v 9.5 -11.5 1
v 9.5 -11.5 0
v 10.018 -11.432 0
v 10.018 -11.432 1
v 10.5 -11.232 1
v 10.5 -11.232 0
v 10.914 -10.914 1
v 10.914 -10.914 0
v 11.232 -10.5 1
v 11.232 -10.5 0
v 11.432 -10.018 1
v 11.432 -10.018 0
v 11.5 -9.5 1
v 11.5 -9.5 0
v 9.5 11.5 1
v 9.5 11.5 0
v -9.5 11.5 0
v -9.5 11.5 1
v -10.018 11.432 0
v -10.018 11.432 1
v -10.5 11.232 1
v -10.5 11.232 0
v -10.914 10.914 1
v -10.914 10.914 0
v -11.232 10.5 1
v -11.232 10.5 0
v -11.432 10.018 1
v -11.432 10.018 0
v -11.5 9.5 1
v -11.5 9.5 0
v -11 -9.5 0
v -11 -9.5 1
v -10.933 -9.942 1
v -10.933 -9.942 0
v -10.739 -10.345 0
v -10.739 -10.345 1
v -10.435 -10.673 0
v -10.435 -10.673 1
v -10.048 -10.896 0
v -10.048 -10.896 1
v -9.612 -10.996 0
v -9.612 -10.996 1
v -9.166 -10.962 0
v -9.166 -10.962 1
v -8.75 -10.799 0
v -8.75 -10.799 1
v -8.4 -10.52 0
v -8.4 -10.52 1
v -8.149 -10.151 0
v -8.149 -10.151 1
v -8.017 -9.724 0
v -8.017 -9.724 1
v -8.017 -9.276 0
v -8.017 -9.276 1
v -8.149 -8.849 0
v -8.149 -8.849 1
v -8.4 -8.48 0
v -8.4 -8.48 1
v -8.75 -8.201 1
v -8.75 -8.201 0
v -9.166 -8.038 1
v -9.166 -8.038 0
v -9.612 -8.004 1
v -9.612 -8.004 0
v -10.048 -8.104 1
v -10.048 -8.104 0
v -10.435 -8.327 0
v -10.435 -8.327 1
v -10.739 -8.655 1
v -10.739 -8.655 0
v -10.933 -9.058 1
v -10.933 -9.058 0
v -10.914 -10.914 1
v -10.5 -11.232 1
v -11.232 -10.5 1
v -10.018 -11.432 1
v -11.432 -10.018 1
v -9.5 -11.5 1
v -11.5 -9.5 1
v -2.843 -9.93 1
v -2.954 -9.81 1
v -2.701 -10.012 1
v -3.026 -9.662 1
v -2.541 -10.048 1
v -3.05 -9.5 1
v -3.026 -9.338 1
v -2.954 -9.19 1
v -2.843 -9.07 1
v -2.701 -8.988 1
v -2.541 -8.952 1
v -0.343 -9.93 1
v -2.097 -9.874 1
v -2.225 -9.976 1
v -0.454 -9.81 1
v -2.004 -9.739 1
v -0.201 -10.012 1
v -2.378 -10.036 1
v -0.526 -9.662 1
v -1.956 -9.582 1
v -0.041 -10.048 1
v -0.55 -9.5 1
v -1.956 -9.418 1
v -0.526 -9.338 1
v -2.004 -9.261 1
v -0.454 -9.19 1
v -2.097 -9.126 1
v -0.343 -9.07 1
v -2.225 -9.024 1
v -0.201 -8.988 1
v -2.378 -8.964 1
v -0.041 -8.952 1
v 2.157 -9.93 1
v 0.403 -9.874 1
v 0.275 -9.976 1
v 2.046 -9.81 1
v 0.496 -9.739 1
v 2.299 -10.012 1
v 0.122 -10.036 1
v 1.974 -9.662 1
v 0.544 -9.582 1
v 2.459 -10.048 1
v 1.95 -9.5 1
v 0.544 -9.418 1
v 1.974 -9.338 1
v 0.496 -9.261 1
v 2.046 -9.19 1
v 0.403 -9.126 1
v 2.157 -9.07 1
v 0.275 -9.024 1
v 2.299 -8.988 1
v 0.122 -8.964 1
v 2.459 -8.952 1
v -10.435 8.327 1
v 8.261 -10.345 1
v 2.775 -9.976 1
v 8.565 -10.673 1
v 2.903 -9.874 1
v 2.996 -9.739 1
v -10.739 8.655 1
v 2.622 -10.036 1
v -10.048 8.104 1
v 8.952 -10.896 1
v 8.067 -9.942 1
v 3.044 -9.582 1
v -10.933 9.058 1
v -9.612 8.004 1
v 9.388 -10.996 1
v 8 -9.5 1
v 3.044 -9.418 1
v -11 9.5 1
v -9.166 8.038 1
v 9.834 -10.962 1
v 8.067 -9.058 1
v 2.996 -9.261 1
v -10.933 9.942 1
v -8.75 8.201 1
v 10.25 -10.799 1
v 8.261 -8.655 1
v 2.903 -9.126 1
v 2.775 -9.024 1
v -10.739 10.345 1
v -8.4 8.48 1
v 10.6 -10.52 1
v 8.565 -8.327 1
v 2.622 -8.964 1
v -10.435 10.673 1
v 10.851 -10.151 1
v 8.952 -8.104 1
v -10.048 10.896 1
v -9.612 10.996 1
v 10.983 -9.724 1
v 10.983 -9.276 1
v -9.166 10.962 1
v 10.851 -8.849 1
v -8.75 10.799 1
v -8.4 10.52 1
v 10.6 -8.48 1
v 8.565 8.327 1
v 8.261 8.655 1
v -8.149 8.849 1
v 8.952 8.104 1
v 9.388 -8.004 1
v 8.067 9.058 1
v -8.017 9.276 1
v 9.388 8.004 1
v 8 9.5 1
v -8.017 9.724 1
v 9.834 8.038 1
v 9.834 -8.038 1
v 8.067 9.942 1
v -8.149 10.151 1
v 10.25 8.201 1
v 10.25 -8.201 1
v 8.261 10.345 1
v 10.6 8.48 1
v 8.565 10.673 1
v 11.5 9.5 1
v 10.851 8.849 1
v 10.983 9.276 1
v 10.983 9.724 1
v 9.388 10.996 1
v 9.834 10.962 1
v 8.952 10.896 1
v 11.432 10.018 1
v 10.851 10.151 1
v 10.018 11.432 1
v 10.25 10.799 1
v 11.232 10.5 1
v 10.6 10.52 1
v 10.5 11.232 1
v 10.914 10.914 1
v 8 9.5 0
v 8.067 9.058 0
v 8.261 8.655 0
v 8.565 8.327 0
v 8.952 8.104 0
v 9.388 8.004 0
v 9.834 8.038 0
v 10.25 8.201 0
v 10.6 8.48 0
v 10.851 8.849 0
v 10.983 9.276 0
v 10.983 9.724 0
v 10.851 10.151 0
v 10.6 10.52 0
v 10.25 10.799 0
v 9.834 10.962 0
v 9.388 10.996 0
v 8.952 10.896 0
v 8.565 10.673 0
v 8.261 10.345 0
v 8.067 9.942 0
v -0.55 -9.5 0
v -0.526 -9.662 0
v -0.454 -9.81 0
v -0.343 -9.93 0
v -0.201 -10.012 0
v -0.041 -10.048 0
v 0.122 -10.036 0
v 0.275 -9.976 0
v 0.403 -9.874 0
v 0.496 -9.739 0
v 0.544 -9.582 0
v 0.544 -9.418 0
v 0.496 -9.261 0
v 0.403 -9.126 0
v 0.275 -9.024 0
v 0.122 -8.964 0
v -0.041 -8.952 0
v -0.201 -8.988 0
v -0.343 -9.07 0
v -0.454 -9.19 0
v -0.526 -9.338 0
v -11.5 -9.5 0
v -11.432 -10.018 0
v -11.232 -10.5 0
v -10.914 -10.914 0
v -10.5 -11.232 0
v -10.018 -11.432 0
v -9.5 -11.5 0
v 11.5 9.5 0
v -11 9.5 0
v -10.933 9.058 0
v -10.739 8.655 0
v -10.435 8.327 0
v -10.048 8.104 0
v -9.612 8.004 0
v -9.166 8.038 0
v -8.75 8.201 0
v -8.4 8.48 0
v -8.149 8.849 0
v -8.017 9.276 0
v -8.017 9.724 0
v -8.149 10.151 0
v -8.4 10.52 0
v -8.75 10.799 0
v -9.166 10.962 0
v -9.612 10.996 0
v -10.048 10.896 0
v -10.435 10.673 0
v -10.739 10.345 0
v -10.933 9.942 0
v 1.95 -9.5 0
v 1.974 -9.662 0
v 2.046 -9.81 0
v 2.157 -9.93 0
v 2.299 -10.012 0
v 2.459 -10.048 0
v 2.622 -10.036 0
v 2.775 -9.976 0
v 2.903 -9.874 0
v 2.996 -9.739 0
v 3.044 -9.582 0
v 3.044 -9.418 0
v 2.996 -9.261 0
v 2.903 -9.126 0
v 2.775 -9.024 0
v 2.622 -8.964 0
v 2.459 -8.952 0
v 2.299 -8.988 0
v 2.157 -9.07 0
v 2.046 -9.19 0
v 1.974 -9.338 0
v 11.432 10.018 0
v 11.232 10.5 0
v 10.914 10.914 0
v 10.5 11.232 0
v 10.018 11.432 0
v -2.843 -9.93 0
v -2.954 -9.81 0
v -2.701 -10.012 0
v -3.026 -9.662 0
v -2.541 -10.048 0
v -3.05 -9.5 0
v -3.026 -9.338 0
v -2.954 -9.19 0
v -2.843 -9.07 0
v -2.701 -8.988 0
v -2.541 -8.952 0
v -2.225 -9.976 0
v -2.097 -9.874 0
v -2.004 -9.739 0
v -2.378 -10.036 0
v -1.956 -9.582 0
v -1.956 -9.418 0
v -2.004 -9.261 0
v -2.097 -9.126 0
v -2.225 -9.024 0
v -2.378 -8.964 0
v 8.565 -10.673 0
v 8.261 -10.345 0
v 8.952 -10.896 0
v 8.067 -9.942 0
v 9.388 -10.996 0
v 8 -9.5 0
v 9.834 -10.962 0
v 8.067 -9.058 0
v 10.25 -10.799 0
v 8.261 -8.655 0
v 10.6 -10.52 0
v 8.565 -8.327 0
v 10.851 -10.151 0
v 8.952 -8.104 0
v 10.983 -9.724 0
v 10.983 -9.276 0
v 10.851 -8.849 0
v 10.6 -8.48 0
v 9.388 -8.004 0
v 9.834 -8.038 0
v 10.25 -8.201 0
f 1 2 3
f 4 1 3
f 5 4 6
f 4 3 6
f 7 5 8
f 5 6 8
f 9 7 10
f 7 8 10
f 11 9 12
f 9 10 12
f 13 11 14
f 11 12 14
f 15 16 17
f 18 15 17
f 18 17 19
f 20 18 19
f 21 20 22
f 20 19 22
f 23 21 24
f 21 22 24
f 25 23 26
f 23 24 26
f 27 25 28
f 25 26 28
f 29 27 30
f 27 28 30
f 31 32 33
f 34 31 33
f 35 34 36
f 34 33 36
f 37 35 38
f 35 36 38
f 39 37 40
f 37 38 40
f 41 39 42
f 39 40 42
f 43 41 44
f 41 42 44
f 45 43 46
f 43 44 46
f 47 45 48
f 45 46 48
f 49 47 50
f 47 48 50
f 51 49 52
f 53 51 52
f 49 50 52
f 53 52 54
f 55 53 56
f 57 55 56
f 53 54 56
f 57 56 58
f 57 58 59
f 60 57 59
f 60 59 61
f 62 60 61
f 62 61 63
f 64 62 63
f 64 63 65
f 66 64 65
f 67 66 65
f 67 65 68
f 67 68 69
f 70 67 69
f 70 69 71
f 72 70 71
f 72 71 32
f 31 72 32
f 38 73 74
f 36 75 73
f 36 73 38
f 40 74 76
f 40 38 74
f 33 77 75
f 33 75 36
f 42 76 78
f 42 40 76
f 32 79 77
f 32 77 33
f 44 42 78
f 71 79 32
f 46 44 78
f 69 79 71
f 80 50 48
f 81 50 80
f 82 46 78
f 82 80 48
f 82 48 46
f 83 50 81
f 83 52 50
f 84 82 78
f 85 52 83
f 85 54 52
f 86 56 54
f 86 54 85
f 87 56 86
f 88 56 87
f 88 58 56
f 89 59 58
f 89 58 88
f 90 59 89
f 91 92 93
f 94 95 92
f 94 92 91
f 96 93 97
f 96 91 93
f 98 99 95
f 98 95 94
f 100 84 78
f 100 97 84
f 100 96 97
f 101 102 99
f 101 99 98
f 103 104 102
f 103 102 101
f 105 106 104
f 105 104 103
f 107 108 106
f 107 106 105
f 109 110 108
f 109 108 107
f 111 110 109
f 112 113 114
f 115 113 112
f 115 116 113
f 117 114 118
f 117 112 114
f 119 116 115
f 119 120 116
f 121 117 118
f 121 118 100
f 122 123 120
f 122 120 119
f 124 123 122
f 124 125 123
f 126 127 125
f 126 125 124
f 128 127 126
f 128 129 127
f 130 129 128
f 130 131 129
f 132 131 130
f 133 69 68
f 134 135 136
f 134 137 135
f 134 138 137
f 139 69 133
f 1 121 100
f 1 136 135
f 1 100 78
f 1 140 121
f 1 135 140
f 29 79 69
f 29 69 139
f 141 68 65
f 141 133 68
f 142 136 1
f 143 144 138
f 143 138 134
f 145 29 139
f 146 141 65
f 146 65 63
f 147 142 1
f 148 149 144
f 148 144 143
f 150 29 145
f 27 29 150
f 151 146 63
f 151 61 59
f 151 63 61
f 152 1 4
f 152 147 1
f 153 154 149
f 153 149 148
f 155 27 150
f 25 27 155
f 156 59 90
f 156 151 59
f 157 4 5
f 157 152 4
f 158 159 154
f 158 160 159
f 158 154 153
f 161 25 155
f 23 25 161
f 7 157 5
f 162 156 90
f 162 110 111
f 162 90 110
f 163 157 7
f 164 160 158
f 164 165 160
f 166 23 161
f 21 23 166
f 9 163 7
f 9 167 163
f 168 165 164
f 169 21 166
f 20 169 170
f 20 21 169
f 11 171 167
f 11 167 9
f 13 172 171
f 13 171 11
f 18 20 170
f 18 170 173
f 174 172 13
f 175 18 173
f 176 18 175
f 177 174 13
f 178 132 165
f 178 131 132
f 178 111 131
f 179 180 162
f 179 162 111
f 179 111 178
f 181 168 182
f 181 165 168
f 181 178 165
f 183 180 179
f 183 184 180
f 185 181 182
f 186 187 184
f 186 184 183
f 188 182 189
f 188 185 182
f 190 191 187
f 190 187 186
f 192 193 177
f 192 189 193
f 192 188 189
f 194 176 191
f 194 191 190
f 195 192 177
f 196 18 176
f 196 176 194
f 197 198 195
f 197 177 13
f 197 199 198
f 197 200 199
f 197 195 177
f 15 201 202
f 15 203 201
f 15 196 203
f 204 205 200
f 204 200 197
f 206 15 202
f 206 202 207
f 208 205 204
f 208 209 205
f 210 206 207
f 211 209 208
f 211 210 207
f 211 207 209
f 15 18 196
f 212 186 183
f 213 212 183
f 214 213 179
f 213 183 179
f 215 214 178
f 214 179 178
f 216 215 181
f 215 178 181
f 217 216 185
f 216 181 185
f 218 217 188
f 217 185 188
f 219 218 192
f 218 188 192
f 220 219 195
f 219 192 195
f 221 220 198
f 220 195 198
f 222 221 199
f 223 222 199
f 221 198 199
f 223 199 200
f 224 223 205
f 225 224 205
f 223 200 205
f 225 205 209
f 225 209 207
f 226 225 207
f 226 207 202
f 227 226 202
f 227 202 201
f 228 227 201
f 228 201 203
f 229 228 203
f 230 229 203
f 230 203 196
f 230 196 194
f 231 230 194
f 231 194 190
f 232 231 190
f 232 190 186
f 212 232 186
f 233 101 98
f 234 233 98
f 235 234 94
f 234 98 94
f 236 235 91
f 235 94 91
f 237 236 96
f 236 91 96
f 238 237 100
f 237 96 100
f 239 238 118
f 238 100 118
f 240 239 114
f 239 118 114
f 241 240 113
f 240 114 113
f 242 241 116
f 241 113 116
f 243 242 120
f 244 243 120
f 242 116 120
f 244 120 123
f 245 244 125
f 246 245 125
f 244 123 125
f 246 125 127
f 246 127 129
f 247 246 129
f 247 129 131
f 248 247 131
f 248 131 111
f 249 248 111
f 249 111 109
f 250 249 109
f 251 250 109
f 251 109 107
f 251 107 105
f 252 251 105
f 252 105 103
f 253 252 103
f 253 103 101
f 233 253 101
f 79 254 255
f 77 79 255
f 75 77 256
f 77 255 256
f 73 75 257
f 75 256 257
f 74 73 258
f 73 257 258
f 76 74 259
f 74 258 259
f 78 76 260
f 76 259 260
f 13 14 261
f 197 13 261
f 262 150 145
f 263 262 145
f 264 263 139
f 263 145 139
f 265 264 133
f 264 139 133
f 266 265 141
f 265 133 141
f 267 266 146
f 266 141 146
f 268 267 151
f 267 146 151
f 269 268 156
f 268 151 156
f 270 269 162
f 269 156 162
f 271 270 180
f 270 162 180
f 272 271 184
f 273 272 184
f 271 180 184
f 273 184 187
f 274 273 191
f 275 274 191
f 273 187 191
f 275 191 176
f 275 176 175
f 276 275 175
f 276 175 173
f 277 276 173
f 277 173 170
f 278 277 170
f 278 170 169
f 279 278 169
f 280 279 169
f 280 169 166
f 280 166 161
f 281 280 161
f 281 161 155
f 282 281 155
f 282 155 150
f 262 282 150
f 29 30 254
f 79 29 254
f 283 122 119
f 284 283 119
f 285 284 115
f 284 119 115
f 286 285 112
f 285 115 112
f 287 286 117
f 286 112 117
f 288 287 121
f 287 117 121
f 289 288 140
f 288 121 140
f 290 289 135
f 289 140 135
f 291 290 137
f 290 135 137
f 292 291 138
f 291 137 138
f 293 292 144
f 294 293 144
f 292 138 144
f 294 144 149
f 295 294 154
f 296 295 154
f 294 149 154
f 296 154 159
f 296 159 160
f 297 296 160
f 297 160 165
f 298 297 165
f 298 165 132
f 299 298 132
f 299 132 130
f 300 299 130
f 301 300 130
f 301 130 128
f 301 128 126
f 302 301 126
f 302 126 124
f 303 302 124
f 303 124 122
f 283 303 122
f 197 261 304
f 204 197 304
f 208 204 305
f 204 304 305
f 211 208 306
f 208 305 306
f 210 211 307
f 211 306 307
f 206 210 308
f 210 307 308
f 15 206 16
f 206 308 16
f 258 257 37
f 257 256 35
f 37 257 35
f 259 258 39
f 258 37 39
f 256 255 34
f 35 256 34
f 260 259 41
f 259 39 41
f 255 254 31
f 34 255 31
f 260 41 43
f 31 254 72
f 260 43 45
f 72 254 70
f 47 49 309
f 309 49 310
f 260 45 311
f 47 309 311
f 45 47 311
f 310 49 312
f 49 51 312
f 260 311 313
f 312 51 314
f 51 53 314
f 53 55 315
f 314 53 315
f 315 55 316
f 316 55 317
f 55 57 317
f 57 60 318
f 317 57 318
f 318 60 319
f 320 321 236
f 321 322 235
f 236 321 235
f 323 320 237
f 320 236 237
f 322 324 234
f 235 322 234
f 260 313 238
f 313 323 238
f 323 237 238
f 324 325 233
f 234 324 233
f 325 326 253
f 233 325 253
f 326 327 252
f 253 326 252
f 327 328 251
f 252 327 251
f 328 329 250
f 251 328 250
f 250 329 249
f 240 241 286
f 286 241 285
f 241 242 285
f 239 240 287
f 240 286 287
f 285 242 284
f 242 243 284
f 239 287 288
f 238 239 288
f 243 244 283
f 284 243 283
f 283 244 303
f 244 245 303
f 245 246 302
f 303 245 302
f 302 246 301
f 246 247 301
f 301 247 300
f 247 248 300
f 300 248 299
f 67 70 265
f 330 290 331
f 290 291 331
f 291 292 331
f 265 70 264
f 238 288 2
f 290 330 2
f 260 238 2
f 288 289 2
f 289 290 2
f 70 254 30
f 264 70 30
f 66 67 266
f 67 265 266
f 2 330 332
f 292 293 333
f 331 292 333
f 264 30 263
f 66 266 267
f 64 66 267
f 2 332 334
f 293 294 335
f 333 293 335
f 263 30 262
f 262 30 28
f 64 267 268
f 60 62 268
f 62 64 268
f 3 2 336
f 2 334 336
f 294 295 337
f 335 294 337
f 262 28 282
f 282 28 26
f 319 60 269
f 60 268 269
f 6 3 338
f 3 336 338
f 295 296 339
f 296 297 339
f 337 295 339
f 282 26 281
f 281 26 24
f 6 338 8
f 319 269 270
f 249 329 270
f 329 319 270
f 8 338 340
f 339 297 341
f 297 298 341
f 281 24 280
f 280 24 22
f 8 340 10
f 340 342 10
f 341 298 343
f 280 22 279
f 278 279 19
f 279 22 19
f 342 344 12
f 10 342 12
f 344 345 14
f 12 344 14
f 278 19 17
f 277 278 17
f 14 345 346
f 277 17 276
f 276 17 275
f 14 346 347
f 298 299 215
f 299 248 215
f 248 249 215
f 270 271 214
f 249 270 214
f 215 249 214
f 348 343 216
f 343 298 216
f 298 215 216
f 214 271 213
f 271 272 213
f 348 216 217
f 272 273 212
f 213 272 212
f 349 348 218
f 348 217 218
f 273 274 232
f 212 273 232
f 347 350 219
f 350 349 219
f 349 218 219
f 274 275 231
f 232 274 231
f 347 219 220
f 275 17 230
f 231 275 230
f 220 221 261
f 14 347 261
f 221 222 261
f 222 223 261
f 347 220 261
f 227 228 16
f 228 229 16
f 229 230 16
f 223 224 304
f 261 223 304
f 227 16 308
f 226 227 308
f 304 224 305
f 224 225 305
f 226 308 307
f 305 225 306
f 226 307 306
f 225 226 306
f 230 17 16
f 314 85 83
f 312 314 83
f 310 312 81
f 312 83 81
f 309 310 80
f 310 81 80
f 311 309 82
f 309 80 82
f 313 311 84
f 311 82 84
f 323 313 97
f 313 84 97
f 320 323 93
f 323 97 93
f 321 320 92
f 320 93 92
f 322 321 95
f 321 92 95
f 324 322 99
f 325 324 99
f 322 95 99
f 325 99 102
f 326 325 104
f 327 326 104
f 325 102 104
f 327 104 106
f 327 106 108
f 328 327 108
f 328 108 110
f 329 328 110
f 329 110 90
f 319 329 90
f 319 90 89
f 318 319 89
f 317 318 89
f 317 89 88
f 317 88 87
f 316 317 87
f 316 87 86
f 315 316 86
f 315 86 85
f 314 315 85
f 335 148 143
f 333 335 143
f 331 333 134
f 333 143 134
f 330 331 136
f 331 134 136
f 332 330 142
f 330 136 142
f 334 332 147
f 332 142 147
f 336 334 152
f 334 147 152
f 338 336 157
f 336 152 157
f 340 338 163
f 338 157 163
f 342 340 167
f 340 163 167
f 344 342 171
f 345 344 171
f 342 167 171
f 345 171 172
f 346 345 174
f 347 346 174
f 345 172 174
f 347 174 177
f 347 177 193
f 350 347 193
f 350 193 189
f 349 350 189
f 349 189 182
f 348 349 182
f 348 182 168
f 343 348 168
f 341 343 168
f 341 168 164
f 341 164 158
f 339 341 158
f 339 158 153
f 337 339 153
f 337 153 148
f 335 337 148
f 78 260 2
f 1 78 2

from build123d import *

# Parameters (mm, degrees)
F1_DEPTH = 1
F2_D     = 3
F3_D     = 1.1


with BuildPart() as f1:
    # F0 (on Top) → F1 (new body)
    with BuildSketch(Plane.XY):
        with BuildLine():
            Line((-9.5, -11.5), (9.5, -11.5))
            ThreePointArc((9.5, -11.5), (10.9142135624, -10.9142135624), (11.5, -9.5))
            Line((11.5, -9.5), (11.5, 9.5))
            ThreePointArc((11.5, 9.5), (10.9142135624, 10.9142135624), (9.5, 11.5))
            Line((9.5, 11.5), (-9.5, 11.5))
            ThreePointArc((-9.5, 11.5), (-10.9142135624, 10.9142135624), (-11.5, 9.5))
            Line((-11.5, 9.5), (-11.5, -9.5))
            ThreePointArc((-11.5, -9.5), (-10.9142135624, -10.9142135624), (-9.5, -11.5))
        make_face()
    extrude(amount=F1_DEPTH)

    # F2 (through all)
    with Locations(Plane(origin=(0, 0, 0), x_dir=(1, 0, 0), z_dir=(0, 0, -1))):
        with Locations((-9.5, -9.5), (9.5, -9.5), (9.5, 9.5), (-9.5, 9.5)):
            Hole(F2_D / 2)

    # F3 (through all)
    with Locations(Plane(origin=(0, 0, 0), x_dir=(1, 0, 0), z_dir=(0, 0, -1))):
        with Locations((-2.5, 9.5), (0, 9.5), (2.5, 9.5)):
            Hole(F3_D / 2)


solid = f1.part
